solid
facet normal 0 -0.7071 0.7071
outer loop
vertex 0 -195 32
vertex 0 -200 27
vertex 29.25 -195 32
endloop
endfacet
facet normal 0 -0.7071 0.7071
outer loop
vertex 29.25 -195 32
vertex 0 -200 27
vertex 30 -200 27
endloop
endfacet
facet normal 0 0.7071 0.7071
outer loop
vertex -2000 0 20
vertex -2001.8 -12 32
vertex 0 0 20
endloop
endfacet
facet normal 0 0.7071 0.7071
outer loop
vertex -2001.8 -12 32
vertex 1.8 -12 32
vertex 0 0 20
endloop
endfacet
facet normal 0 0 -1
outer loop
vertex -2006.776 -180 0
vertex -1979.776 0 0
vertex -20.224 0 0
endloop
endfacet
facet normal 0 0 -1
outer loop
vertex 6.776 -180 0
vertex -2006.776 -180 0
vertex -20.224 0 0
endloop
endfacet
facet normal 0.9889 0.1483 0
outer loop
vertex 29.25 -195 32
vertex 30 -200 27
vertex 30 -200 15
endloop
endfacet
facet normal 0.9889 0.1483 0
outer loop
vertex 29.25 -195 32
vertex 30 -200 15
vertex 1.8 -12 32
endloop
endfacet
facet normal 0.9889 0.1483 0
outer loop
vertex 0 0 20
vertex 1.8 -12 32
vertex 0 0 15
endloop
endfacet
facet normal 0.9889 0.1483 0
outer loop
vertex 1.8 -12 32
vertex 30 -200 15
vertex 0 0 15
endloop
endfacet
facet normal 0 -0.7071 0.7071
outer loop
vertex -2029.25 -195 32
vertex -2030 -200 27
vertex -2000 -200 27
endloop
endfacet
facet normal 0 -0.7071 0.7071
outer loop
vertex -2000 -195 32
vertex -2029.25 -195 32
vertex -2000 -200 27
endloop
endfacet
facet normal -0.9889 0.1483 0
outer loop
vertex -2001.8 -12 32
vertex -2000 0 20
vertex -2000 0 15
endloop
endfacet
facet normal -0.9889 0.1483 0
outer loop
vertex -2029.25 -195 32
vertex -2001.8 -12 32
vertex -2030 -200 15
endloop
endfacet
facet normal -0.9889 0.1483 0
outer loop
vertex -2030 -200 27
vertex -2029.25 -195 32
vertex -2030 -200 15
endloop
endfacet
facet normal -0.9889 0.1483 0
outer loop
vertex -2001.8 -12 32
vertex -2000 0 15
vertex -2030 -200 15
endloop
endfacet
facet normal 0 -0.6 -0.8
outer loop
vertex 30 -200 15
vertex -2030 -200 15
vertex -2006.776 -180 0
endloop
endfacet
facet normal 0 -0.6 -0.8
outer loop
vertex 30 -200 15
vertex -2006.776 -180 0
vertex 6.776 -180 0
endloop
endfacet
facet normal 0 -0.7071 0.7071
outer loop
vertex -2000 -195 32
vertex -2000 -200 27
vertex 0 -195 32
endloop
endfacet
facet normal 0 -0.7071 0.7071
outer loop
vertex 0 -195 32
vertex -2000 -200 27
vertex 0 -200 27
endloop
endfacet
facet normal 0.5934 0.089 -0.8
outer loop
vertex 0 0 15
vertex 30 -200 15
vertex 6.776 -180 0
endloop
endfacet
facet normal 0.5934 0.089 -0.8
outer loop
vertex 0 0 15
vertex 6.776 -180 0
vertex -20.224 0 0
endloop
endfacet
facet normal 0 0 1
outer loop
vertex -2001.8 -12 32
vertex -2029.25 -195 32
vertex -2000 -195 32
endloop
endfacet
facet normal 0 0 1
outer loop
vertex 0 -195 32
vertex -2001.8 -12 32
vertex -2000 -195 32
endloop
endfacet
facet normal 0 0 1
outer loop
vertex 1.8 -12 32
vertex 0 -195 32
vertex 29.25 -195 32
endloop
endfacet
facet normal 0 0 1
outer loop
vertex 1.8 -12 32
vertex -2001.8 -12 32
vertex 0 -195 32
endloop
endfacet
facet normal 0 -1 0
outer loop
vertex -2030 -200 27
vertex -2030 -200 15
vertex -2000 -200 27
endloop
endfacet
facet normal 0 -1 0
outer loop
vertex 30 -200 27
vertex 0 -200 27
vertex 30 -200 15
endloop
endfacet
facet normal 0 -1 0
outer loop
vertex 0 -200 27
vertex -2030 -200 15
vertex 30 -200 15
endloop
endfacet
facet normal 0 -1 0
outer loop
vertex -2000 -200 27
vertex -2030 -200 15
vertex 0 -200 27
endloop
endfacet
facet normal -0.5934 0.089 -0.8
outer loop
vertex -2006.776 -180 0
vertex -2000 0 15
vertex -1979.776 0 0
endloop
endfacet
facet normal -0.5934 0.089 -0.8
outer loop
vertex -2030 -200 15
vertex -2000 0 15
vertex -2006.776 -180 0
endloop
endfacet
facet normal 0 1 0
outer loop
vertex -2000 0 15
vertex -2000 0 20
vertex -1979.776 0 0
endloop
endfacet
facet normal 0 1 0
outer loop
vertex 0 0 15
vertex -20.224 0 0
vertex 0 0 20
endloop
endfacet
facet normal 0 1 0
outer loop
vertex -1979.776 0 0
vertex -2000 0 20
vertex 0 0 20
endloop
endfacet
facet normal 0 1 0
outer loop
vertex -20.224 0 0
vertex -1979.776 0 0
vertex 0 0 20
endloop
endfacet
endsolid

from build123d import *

# Parameters (mm, degrees)
F0_W      = 2000
F0_H      = 32
F1_DEPTH  = 200
F2_SIZE   = 12
F3_SIZE   = 5
F5_DEPTH  = 32
F6_SIZE   = 4.99999
F7_SIZE   = 4.99999
F9_DEPTH  = 2097
F10_SIZE2 = 15
F10_SIZE  = 20


# Not quite as in the source:
# - a fillet or chamfer is up to 0.001 mm smaller than in the source, because OpenCascade refuses the exact size


with BuildPart() as f1:
    # F0 (on Front) → F1 (new body)
    with BuildSketch(Plane.XZ):
        with Locations((-1000, 16)):
            Rectangle(F0_W, F0_H)
    extrude(amount=F1_DEPTH)

    # F2
    f2_edges = [f1.edges().sort_by_distance(p)[0] for p in [
        (-1000, 0, 32),
    ]]
    chamfer(f2_edges, length=F2_SIZE)

    # F3
    f3_edges = [f1.edges().sort_by_distance(p)[0] for p in [
        (-1000, -200, 32),
    ]]
    chamfer(f3_edges, length=F3_SIZE)

    # F4 (on Top) → F5 (join)
    with BuildSketch(Plane.XY):
        Polygon((30, -200), (0, 0), (0, -200), align=None)
        Polygon((-2000, 0), (-2030, -200), (-2000, -200), align=None)
    extrude(amount=F5_DEPTH)

    # F6 (size 5 in the source; OpenCascade refuses exactly that, so slightly less here)
    f6_edges = [f1.edges().sort_by_distance(p)[0] for p in [
        (-2015, -200, 32),
    ]]
    chamfer(f6_edges, length=F6_SIZE)

    # F7 (size 5 in the source; OpenCascade refuses exactly that, so slightly less here)
    f7_edges = [f1.edges().sort_by_distance(p)[0] for p in [
        (15, -200, 32),
    ]]
    chamfer(f7_edges, length=F7_SIZE)

    # F8 (on Right) → F9 (cut, symmetric)
    with BuildSketch(Plane.YZ):
        Polygon((-12, 32), (0, 20), (0, 32), align=None)
    extrude(amount=F9_DEPTH, both=True, mode=Mode.SUBTRACT)

    # F10
    f10_edges = [f1.edges().sort_by_distance(p)[0] for p in [
        (-1000, -200, 0),
        (-2015, -100, 0),
        (15, -100, 0),
    ]]
    f10_side = f1.faces().sort_by_distance((-1000, -100.492611, 0))[0]
    chamfer(f10_edges, length=F10_SIZE, length2=F10_SIZE2, reference=f10_side)


solid = f1.part
